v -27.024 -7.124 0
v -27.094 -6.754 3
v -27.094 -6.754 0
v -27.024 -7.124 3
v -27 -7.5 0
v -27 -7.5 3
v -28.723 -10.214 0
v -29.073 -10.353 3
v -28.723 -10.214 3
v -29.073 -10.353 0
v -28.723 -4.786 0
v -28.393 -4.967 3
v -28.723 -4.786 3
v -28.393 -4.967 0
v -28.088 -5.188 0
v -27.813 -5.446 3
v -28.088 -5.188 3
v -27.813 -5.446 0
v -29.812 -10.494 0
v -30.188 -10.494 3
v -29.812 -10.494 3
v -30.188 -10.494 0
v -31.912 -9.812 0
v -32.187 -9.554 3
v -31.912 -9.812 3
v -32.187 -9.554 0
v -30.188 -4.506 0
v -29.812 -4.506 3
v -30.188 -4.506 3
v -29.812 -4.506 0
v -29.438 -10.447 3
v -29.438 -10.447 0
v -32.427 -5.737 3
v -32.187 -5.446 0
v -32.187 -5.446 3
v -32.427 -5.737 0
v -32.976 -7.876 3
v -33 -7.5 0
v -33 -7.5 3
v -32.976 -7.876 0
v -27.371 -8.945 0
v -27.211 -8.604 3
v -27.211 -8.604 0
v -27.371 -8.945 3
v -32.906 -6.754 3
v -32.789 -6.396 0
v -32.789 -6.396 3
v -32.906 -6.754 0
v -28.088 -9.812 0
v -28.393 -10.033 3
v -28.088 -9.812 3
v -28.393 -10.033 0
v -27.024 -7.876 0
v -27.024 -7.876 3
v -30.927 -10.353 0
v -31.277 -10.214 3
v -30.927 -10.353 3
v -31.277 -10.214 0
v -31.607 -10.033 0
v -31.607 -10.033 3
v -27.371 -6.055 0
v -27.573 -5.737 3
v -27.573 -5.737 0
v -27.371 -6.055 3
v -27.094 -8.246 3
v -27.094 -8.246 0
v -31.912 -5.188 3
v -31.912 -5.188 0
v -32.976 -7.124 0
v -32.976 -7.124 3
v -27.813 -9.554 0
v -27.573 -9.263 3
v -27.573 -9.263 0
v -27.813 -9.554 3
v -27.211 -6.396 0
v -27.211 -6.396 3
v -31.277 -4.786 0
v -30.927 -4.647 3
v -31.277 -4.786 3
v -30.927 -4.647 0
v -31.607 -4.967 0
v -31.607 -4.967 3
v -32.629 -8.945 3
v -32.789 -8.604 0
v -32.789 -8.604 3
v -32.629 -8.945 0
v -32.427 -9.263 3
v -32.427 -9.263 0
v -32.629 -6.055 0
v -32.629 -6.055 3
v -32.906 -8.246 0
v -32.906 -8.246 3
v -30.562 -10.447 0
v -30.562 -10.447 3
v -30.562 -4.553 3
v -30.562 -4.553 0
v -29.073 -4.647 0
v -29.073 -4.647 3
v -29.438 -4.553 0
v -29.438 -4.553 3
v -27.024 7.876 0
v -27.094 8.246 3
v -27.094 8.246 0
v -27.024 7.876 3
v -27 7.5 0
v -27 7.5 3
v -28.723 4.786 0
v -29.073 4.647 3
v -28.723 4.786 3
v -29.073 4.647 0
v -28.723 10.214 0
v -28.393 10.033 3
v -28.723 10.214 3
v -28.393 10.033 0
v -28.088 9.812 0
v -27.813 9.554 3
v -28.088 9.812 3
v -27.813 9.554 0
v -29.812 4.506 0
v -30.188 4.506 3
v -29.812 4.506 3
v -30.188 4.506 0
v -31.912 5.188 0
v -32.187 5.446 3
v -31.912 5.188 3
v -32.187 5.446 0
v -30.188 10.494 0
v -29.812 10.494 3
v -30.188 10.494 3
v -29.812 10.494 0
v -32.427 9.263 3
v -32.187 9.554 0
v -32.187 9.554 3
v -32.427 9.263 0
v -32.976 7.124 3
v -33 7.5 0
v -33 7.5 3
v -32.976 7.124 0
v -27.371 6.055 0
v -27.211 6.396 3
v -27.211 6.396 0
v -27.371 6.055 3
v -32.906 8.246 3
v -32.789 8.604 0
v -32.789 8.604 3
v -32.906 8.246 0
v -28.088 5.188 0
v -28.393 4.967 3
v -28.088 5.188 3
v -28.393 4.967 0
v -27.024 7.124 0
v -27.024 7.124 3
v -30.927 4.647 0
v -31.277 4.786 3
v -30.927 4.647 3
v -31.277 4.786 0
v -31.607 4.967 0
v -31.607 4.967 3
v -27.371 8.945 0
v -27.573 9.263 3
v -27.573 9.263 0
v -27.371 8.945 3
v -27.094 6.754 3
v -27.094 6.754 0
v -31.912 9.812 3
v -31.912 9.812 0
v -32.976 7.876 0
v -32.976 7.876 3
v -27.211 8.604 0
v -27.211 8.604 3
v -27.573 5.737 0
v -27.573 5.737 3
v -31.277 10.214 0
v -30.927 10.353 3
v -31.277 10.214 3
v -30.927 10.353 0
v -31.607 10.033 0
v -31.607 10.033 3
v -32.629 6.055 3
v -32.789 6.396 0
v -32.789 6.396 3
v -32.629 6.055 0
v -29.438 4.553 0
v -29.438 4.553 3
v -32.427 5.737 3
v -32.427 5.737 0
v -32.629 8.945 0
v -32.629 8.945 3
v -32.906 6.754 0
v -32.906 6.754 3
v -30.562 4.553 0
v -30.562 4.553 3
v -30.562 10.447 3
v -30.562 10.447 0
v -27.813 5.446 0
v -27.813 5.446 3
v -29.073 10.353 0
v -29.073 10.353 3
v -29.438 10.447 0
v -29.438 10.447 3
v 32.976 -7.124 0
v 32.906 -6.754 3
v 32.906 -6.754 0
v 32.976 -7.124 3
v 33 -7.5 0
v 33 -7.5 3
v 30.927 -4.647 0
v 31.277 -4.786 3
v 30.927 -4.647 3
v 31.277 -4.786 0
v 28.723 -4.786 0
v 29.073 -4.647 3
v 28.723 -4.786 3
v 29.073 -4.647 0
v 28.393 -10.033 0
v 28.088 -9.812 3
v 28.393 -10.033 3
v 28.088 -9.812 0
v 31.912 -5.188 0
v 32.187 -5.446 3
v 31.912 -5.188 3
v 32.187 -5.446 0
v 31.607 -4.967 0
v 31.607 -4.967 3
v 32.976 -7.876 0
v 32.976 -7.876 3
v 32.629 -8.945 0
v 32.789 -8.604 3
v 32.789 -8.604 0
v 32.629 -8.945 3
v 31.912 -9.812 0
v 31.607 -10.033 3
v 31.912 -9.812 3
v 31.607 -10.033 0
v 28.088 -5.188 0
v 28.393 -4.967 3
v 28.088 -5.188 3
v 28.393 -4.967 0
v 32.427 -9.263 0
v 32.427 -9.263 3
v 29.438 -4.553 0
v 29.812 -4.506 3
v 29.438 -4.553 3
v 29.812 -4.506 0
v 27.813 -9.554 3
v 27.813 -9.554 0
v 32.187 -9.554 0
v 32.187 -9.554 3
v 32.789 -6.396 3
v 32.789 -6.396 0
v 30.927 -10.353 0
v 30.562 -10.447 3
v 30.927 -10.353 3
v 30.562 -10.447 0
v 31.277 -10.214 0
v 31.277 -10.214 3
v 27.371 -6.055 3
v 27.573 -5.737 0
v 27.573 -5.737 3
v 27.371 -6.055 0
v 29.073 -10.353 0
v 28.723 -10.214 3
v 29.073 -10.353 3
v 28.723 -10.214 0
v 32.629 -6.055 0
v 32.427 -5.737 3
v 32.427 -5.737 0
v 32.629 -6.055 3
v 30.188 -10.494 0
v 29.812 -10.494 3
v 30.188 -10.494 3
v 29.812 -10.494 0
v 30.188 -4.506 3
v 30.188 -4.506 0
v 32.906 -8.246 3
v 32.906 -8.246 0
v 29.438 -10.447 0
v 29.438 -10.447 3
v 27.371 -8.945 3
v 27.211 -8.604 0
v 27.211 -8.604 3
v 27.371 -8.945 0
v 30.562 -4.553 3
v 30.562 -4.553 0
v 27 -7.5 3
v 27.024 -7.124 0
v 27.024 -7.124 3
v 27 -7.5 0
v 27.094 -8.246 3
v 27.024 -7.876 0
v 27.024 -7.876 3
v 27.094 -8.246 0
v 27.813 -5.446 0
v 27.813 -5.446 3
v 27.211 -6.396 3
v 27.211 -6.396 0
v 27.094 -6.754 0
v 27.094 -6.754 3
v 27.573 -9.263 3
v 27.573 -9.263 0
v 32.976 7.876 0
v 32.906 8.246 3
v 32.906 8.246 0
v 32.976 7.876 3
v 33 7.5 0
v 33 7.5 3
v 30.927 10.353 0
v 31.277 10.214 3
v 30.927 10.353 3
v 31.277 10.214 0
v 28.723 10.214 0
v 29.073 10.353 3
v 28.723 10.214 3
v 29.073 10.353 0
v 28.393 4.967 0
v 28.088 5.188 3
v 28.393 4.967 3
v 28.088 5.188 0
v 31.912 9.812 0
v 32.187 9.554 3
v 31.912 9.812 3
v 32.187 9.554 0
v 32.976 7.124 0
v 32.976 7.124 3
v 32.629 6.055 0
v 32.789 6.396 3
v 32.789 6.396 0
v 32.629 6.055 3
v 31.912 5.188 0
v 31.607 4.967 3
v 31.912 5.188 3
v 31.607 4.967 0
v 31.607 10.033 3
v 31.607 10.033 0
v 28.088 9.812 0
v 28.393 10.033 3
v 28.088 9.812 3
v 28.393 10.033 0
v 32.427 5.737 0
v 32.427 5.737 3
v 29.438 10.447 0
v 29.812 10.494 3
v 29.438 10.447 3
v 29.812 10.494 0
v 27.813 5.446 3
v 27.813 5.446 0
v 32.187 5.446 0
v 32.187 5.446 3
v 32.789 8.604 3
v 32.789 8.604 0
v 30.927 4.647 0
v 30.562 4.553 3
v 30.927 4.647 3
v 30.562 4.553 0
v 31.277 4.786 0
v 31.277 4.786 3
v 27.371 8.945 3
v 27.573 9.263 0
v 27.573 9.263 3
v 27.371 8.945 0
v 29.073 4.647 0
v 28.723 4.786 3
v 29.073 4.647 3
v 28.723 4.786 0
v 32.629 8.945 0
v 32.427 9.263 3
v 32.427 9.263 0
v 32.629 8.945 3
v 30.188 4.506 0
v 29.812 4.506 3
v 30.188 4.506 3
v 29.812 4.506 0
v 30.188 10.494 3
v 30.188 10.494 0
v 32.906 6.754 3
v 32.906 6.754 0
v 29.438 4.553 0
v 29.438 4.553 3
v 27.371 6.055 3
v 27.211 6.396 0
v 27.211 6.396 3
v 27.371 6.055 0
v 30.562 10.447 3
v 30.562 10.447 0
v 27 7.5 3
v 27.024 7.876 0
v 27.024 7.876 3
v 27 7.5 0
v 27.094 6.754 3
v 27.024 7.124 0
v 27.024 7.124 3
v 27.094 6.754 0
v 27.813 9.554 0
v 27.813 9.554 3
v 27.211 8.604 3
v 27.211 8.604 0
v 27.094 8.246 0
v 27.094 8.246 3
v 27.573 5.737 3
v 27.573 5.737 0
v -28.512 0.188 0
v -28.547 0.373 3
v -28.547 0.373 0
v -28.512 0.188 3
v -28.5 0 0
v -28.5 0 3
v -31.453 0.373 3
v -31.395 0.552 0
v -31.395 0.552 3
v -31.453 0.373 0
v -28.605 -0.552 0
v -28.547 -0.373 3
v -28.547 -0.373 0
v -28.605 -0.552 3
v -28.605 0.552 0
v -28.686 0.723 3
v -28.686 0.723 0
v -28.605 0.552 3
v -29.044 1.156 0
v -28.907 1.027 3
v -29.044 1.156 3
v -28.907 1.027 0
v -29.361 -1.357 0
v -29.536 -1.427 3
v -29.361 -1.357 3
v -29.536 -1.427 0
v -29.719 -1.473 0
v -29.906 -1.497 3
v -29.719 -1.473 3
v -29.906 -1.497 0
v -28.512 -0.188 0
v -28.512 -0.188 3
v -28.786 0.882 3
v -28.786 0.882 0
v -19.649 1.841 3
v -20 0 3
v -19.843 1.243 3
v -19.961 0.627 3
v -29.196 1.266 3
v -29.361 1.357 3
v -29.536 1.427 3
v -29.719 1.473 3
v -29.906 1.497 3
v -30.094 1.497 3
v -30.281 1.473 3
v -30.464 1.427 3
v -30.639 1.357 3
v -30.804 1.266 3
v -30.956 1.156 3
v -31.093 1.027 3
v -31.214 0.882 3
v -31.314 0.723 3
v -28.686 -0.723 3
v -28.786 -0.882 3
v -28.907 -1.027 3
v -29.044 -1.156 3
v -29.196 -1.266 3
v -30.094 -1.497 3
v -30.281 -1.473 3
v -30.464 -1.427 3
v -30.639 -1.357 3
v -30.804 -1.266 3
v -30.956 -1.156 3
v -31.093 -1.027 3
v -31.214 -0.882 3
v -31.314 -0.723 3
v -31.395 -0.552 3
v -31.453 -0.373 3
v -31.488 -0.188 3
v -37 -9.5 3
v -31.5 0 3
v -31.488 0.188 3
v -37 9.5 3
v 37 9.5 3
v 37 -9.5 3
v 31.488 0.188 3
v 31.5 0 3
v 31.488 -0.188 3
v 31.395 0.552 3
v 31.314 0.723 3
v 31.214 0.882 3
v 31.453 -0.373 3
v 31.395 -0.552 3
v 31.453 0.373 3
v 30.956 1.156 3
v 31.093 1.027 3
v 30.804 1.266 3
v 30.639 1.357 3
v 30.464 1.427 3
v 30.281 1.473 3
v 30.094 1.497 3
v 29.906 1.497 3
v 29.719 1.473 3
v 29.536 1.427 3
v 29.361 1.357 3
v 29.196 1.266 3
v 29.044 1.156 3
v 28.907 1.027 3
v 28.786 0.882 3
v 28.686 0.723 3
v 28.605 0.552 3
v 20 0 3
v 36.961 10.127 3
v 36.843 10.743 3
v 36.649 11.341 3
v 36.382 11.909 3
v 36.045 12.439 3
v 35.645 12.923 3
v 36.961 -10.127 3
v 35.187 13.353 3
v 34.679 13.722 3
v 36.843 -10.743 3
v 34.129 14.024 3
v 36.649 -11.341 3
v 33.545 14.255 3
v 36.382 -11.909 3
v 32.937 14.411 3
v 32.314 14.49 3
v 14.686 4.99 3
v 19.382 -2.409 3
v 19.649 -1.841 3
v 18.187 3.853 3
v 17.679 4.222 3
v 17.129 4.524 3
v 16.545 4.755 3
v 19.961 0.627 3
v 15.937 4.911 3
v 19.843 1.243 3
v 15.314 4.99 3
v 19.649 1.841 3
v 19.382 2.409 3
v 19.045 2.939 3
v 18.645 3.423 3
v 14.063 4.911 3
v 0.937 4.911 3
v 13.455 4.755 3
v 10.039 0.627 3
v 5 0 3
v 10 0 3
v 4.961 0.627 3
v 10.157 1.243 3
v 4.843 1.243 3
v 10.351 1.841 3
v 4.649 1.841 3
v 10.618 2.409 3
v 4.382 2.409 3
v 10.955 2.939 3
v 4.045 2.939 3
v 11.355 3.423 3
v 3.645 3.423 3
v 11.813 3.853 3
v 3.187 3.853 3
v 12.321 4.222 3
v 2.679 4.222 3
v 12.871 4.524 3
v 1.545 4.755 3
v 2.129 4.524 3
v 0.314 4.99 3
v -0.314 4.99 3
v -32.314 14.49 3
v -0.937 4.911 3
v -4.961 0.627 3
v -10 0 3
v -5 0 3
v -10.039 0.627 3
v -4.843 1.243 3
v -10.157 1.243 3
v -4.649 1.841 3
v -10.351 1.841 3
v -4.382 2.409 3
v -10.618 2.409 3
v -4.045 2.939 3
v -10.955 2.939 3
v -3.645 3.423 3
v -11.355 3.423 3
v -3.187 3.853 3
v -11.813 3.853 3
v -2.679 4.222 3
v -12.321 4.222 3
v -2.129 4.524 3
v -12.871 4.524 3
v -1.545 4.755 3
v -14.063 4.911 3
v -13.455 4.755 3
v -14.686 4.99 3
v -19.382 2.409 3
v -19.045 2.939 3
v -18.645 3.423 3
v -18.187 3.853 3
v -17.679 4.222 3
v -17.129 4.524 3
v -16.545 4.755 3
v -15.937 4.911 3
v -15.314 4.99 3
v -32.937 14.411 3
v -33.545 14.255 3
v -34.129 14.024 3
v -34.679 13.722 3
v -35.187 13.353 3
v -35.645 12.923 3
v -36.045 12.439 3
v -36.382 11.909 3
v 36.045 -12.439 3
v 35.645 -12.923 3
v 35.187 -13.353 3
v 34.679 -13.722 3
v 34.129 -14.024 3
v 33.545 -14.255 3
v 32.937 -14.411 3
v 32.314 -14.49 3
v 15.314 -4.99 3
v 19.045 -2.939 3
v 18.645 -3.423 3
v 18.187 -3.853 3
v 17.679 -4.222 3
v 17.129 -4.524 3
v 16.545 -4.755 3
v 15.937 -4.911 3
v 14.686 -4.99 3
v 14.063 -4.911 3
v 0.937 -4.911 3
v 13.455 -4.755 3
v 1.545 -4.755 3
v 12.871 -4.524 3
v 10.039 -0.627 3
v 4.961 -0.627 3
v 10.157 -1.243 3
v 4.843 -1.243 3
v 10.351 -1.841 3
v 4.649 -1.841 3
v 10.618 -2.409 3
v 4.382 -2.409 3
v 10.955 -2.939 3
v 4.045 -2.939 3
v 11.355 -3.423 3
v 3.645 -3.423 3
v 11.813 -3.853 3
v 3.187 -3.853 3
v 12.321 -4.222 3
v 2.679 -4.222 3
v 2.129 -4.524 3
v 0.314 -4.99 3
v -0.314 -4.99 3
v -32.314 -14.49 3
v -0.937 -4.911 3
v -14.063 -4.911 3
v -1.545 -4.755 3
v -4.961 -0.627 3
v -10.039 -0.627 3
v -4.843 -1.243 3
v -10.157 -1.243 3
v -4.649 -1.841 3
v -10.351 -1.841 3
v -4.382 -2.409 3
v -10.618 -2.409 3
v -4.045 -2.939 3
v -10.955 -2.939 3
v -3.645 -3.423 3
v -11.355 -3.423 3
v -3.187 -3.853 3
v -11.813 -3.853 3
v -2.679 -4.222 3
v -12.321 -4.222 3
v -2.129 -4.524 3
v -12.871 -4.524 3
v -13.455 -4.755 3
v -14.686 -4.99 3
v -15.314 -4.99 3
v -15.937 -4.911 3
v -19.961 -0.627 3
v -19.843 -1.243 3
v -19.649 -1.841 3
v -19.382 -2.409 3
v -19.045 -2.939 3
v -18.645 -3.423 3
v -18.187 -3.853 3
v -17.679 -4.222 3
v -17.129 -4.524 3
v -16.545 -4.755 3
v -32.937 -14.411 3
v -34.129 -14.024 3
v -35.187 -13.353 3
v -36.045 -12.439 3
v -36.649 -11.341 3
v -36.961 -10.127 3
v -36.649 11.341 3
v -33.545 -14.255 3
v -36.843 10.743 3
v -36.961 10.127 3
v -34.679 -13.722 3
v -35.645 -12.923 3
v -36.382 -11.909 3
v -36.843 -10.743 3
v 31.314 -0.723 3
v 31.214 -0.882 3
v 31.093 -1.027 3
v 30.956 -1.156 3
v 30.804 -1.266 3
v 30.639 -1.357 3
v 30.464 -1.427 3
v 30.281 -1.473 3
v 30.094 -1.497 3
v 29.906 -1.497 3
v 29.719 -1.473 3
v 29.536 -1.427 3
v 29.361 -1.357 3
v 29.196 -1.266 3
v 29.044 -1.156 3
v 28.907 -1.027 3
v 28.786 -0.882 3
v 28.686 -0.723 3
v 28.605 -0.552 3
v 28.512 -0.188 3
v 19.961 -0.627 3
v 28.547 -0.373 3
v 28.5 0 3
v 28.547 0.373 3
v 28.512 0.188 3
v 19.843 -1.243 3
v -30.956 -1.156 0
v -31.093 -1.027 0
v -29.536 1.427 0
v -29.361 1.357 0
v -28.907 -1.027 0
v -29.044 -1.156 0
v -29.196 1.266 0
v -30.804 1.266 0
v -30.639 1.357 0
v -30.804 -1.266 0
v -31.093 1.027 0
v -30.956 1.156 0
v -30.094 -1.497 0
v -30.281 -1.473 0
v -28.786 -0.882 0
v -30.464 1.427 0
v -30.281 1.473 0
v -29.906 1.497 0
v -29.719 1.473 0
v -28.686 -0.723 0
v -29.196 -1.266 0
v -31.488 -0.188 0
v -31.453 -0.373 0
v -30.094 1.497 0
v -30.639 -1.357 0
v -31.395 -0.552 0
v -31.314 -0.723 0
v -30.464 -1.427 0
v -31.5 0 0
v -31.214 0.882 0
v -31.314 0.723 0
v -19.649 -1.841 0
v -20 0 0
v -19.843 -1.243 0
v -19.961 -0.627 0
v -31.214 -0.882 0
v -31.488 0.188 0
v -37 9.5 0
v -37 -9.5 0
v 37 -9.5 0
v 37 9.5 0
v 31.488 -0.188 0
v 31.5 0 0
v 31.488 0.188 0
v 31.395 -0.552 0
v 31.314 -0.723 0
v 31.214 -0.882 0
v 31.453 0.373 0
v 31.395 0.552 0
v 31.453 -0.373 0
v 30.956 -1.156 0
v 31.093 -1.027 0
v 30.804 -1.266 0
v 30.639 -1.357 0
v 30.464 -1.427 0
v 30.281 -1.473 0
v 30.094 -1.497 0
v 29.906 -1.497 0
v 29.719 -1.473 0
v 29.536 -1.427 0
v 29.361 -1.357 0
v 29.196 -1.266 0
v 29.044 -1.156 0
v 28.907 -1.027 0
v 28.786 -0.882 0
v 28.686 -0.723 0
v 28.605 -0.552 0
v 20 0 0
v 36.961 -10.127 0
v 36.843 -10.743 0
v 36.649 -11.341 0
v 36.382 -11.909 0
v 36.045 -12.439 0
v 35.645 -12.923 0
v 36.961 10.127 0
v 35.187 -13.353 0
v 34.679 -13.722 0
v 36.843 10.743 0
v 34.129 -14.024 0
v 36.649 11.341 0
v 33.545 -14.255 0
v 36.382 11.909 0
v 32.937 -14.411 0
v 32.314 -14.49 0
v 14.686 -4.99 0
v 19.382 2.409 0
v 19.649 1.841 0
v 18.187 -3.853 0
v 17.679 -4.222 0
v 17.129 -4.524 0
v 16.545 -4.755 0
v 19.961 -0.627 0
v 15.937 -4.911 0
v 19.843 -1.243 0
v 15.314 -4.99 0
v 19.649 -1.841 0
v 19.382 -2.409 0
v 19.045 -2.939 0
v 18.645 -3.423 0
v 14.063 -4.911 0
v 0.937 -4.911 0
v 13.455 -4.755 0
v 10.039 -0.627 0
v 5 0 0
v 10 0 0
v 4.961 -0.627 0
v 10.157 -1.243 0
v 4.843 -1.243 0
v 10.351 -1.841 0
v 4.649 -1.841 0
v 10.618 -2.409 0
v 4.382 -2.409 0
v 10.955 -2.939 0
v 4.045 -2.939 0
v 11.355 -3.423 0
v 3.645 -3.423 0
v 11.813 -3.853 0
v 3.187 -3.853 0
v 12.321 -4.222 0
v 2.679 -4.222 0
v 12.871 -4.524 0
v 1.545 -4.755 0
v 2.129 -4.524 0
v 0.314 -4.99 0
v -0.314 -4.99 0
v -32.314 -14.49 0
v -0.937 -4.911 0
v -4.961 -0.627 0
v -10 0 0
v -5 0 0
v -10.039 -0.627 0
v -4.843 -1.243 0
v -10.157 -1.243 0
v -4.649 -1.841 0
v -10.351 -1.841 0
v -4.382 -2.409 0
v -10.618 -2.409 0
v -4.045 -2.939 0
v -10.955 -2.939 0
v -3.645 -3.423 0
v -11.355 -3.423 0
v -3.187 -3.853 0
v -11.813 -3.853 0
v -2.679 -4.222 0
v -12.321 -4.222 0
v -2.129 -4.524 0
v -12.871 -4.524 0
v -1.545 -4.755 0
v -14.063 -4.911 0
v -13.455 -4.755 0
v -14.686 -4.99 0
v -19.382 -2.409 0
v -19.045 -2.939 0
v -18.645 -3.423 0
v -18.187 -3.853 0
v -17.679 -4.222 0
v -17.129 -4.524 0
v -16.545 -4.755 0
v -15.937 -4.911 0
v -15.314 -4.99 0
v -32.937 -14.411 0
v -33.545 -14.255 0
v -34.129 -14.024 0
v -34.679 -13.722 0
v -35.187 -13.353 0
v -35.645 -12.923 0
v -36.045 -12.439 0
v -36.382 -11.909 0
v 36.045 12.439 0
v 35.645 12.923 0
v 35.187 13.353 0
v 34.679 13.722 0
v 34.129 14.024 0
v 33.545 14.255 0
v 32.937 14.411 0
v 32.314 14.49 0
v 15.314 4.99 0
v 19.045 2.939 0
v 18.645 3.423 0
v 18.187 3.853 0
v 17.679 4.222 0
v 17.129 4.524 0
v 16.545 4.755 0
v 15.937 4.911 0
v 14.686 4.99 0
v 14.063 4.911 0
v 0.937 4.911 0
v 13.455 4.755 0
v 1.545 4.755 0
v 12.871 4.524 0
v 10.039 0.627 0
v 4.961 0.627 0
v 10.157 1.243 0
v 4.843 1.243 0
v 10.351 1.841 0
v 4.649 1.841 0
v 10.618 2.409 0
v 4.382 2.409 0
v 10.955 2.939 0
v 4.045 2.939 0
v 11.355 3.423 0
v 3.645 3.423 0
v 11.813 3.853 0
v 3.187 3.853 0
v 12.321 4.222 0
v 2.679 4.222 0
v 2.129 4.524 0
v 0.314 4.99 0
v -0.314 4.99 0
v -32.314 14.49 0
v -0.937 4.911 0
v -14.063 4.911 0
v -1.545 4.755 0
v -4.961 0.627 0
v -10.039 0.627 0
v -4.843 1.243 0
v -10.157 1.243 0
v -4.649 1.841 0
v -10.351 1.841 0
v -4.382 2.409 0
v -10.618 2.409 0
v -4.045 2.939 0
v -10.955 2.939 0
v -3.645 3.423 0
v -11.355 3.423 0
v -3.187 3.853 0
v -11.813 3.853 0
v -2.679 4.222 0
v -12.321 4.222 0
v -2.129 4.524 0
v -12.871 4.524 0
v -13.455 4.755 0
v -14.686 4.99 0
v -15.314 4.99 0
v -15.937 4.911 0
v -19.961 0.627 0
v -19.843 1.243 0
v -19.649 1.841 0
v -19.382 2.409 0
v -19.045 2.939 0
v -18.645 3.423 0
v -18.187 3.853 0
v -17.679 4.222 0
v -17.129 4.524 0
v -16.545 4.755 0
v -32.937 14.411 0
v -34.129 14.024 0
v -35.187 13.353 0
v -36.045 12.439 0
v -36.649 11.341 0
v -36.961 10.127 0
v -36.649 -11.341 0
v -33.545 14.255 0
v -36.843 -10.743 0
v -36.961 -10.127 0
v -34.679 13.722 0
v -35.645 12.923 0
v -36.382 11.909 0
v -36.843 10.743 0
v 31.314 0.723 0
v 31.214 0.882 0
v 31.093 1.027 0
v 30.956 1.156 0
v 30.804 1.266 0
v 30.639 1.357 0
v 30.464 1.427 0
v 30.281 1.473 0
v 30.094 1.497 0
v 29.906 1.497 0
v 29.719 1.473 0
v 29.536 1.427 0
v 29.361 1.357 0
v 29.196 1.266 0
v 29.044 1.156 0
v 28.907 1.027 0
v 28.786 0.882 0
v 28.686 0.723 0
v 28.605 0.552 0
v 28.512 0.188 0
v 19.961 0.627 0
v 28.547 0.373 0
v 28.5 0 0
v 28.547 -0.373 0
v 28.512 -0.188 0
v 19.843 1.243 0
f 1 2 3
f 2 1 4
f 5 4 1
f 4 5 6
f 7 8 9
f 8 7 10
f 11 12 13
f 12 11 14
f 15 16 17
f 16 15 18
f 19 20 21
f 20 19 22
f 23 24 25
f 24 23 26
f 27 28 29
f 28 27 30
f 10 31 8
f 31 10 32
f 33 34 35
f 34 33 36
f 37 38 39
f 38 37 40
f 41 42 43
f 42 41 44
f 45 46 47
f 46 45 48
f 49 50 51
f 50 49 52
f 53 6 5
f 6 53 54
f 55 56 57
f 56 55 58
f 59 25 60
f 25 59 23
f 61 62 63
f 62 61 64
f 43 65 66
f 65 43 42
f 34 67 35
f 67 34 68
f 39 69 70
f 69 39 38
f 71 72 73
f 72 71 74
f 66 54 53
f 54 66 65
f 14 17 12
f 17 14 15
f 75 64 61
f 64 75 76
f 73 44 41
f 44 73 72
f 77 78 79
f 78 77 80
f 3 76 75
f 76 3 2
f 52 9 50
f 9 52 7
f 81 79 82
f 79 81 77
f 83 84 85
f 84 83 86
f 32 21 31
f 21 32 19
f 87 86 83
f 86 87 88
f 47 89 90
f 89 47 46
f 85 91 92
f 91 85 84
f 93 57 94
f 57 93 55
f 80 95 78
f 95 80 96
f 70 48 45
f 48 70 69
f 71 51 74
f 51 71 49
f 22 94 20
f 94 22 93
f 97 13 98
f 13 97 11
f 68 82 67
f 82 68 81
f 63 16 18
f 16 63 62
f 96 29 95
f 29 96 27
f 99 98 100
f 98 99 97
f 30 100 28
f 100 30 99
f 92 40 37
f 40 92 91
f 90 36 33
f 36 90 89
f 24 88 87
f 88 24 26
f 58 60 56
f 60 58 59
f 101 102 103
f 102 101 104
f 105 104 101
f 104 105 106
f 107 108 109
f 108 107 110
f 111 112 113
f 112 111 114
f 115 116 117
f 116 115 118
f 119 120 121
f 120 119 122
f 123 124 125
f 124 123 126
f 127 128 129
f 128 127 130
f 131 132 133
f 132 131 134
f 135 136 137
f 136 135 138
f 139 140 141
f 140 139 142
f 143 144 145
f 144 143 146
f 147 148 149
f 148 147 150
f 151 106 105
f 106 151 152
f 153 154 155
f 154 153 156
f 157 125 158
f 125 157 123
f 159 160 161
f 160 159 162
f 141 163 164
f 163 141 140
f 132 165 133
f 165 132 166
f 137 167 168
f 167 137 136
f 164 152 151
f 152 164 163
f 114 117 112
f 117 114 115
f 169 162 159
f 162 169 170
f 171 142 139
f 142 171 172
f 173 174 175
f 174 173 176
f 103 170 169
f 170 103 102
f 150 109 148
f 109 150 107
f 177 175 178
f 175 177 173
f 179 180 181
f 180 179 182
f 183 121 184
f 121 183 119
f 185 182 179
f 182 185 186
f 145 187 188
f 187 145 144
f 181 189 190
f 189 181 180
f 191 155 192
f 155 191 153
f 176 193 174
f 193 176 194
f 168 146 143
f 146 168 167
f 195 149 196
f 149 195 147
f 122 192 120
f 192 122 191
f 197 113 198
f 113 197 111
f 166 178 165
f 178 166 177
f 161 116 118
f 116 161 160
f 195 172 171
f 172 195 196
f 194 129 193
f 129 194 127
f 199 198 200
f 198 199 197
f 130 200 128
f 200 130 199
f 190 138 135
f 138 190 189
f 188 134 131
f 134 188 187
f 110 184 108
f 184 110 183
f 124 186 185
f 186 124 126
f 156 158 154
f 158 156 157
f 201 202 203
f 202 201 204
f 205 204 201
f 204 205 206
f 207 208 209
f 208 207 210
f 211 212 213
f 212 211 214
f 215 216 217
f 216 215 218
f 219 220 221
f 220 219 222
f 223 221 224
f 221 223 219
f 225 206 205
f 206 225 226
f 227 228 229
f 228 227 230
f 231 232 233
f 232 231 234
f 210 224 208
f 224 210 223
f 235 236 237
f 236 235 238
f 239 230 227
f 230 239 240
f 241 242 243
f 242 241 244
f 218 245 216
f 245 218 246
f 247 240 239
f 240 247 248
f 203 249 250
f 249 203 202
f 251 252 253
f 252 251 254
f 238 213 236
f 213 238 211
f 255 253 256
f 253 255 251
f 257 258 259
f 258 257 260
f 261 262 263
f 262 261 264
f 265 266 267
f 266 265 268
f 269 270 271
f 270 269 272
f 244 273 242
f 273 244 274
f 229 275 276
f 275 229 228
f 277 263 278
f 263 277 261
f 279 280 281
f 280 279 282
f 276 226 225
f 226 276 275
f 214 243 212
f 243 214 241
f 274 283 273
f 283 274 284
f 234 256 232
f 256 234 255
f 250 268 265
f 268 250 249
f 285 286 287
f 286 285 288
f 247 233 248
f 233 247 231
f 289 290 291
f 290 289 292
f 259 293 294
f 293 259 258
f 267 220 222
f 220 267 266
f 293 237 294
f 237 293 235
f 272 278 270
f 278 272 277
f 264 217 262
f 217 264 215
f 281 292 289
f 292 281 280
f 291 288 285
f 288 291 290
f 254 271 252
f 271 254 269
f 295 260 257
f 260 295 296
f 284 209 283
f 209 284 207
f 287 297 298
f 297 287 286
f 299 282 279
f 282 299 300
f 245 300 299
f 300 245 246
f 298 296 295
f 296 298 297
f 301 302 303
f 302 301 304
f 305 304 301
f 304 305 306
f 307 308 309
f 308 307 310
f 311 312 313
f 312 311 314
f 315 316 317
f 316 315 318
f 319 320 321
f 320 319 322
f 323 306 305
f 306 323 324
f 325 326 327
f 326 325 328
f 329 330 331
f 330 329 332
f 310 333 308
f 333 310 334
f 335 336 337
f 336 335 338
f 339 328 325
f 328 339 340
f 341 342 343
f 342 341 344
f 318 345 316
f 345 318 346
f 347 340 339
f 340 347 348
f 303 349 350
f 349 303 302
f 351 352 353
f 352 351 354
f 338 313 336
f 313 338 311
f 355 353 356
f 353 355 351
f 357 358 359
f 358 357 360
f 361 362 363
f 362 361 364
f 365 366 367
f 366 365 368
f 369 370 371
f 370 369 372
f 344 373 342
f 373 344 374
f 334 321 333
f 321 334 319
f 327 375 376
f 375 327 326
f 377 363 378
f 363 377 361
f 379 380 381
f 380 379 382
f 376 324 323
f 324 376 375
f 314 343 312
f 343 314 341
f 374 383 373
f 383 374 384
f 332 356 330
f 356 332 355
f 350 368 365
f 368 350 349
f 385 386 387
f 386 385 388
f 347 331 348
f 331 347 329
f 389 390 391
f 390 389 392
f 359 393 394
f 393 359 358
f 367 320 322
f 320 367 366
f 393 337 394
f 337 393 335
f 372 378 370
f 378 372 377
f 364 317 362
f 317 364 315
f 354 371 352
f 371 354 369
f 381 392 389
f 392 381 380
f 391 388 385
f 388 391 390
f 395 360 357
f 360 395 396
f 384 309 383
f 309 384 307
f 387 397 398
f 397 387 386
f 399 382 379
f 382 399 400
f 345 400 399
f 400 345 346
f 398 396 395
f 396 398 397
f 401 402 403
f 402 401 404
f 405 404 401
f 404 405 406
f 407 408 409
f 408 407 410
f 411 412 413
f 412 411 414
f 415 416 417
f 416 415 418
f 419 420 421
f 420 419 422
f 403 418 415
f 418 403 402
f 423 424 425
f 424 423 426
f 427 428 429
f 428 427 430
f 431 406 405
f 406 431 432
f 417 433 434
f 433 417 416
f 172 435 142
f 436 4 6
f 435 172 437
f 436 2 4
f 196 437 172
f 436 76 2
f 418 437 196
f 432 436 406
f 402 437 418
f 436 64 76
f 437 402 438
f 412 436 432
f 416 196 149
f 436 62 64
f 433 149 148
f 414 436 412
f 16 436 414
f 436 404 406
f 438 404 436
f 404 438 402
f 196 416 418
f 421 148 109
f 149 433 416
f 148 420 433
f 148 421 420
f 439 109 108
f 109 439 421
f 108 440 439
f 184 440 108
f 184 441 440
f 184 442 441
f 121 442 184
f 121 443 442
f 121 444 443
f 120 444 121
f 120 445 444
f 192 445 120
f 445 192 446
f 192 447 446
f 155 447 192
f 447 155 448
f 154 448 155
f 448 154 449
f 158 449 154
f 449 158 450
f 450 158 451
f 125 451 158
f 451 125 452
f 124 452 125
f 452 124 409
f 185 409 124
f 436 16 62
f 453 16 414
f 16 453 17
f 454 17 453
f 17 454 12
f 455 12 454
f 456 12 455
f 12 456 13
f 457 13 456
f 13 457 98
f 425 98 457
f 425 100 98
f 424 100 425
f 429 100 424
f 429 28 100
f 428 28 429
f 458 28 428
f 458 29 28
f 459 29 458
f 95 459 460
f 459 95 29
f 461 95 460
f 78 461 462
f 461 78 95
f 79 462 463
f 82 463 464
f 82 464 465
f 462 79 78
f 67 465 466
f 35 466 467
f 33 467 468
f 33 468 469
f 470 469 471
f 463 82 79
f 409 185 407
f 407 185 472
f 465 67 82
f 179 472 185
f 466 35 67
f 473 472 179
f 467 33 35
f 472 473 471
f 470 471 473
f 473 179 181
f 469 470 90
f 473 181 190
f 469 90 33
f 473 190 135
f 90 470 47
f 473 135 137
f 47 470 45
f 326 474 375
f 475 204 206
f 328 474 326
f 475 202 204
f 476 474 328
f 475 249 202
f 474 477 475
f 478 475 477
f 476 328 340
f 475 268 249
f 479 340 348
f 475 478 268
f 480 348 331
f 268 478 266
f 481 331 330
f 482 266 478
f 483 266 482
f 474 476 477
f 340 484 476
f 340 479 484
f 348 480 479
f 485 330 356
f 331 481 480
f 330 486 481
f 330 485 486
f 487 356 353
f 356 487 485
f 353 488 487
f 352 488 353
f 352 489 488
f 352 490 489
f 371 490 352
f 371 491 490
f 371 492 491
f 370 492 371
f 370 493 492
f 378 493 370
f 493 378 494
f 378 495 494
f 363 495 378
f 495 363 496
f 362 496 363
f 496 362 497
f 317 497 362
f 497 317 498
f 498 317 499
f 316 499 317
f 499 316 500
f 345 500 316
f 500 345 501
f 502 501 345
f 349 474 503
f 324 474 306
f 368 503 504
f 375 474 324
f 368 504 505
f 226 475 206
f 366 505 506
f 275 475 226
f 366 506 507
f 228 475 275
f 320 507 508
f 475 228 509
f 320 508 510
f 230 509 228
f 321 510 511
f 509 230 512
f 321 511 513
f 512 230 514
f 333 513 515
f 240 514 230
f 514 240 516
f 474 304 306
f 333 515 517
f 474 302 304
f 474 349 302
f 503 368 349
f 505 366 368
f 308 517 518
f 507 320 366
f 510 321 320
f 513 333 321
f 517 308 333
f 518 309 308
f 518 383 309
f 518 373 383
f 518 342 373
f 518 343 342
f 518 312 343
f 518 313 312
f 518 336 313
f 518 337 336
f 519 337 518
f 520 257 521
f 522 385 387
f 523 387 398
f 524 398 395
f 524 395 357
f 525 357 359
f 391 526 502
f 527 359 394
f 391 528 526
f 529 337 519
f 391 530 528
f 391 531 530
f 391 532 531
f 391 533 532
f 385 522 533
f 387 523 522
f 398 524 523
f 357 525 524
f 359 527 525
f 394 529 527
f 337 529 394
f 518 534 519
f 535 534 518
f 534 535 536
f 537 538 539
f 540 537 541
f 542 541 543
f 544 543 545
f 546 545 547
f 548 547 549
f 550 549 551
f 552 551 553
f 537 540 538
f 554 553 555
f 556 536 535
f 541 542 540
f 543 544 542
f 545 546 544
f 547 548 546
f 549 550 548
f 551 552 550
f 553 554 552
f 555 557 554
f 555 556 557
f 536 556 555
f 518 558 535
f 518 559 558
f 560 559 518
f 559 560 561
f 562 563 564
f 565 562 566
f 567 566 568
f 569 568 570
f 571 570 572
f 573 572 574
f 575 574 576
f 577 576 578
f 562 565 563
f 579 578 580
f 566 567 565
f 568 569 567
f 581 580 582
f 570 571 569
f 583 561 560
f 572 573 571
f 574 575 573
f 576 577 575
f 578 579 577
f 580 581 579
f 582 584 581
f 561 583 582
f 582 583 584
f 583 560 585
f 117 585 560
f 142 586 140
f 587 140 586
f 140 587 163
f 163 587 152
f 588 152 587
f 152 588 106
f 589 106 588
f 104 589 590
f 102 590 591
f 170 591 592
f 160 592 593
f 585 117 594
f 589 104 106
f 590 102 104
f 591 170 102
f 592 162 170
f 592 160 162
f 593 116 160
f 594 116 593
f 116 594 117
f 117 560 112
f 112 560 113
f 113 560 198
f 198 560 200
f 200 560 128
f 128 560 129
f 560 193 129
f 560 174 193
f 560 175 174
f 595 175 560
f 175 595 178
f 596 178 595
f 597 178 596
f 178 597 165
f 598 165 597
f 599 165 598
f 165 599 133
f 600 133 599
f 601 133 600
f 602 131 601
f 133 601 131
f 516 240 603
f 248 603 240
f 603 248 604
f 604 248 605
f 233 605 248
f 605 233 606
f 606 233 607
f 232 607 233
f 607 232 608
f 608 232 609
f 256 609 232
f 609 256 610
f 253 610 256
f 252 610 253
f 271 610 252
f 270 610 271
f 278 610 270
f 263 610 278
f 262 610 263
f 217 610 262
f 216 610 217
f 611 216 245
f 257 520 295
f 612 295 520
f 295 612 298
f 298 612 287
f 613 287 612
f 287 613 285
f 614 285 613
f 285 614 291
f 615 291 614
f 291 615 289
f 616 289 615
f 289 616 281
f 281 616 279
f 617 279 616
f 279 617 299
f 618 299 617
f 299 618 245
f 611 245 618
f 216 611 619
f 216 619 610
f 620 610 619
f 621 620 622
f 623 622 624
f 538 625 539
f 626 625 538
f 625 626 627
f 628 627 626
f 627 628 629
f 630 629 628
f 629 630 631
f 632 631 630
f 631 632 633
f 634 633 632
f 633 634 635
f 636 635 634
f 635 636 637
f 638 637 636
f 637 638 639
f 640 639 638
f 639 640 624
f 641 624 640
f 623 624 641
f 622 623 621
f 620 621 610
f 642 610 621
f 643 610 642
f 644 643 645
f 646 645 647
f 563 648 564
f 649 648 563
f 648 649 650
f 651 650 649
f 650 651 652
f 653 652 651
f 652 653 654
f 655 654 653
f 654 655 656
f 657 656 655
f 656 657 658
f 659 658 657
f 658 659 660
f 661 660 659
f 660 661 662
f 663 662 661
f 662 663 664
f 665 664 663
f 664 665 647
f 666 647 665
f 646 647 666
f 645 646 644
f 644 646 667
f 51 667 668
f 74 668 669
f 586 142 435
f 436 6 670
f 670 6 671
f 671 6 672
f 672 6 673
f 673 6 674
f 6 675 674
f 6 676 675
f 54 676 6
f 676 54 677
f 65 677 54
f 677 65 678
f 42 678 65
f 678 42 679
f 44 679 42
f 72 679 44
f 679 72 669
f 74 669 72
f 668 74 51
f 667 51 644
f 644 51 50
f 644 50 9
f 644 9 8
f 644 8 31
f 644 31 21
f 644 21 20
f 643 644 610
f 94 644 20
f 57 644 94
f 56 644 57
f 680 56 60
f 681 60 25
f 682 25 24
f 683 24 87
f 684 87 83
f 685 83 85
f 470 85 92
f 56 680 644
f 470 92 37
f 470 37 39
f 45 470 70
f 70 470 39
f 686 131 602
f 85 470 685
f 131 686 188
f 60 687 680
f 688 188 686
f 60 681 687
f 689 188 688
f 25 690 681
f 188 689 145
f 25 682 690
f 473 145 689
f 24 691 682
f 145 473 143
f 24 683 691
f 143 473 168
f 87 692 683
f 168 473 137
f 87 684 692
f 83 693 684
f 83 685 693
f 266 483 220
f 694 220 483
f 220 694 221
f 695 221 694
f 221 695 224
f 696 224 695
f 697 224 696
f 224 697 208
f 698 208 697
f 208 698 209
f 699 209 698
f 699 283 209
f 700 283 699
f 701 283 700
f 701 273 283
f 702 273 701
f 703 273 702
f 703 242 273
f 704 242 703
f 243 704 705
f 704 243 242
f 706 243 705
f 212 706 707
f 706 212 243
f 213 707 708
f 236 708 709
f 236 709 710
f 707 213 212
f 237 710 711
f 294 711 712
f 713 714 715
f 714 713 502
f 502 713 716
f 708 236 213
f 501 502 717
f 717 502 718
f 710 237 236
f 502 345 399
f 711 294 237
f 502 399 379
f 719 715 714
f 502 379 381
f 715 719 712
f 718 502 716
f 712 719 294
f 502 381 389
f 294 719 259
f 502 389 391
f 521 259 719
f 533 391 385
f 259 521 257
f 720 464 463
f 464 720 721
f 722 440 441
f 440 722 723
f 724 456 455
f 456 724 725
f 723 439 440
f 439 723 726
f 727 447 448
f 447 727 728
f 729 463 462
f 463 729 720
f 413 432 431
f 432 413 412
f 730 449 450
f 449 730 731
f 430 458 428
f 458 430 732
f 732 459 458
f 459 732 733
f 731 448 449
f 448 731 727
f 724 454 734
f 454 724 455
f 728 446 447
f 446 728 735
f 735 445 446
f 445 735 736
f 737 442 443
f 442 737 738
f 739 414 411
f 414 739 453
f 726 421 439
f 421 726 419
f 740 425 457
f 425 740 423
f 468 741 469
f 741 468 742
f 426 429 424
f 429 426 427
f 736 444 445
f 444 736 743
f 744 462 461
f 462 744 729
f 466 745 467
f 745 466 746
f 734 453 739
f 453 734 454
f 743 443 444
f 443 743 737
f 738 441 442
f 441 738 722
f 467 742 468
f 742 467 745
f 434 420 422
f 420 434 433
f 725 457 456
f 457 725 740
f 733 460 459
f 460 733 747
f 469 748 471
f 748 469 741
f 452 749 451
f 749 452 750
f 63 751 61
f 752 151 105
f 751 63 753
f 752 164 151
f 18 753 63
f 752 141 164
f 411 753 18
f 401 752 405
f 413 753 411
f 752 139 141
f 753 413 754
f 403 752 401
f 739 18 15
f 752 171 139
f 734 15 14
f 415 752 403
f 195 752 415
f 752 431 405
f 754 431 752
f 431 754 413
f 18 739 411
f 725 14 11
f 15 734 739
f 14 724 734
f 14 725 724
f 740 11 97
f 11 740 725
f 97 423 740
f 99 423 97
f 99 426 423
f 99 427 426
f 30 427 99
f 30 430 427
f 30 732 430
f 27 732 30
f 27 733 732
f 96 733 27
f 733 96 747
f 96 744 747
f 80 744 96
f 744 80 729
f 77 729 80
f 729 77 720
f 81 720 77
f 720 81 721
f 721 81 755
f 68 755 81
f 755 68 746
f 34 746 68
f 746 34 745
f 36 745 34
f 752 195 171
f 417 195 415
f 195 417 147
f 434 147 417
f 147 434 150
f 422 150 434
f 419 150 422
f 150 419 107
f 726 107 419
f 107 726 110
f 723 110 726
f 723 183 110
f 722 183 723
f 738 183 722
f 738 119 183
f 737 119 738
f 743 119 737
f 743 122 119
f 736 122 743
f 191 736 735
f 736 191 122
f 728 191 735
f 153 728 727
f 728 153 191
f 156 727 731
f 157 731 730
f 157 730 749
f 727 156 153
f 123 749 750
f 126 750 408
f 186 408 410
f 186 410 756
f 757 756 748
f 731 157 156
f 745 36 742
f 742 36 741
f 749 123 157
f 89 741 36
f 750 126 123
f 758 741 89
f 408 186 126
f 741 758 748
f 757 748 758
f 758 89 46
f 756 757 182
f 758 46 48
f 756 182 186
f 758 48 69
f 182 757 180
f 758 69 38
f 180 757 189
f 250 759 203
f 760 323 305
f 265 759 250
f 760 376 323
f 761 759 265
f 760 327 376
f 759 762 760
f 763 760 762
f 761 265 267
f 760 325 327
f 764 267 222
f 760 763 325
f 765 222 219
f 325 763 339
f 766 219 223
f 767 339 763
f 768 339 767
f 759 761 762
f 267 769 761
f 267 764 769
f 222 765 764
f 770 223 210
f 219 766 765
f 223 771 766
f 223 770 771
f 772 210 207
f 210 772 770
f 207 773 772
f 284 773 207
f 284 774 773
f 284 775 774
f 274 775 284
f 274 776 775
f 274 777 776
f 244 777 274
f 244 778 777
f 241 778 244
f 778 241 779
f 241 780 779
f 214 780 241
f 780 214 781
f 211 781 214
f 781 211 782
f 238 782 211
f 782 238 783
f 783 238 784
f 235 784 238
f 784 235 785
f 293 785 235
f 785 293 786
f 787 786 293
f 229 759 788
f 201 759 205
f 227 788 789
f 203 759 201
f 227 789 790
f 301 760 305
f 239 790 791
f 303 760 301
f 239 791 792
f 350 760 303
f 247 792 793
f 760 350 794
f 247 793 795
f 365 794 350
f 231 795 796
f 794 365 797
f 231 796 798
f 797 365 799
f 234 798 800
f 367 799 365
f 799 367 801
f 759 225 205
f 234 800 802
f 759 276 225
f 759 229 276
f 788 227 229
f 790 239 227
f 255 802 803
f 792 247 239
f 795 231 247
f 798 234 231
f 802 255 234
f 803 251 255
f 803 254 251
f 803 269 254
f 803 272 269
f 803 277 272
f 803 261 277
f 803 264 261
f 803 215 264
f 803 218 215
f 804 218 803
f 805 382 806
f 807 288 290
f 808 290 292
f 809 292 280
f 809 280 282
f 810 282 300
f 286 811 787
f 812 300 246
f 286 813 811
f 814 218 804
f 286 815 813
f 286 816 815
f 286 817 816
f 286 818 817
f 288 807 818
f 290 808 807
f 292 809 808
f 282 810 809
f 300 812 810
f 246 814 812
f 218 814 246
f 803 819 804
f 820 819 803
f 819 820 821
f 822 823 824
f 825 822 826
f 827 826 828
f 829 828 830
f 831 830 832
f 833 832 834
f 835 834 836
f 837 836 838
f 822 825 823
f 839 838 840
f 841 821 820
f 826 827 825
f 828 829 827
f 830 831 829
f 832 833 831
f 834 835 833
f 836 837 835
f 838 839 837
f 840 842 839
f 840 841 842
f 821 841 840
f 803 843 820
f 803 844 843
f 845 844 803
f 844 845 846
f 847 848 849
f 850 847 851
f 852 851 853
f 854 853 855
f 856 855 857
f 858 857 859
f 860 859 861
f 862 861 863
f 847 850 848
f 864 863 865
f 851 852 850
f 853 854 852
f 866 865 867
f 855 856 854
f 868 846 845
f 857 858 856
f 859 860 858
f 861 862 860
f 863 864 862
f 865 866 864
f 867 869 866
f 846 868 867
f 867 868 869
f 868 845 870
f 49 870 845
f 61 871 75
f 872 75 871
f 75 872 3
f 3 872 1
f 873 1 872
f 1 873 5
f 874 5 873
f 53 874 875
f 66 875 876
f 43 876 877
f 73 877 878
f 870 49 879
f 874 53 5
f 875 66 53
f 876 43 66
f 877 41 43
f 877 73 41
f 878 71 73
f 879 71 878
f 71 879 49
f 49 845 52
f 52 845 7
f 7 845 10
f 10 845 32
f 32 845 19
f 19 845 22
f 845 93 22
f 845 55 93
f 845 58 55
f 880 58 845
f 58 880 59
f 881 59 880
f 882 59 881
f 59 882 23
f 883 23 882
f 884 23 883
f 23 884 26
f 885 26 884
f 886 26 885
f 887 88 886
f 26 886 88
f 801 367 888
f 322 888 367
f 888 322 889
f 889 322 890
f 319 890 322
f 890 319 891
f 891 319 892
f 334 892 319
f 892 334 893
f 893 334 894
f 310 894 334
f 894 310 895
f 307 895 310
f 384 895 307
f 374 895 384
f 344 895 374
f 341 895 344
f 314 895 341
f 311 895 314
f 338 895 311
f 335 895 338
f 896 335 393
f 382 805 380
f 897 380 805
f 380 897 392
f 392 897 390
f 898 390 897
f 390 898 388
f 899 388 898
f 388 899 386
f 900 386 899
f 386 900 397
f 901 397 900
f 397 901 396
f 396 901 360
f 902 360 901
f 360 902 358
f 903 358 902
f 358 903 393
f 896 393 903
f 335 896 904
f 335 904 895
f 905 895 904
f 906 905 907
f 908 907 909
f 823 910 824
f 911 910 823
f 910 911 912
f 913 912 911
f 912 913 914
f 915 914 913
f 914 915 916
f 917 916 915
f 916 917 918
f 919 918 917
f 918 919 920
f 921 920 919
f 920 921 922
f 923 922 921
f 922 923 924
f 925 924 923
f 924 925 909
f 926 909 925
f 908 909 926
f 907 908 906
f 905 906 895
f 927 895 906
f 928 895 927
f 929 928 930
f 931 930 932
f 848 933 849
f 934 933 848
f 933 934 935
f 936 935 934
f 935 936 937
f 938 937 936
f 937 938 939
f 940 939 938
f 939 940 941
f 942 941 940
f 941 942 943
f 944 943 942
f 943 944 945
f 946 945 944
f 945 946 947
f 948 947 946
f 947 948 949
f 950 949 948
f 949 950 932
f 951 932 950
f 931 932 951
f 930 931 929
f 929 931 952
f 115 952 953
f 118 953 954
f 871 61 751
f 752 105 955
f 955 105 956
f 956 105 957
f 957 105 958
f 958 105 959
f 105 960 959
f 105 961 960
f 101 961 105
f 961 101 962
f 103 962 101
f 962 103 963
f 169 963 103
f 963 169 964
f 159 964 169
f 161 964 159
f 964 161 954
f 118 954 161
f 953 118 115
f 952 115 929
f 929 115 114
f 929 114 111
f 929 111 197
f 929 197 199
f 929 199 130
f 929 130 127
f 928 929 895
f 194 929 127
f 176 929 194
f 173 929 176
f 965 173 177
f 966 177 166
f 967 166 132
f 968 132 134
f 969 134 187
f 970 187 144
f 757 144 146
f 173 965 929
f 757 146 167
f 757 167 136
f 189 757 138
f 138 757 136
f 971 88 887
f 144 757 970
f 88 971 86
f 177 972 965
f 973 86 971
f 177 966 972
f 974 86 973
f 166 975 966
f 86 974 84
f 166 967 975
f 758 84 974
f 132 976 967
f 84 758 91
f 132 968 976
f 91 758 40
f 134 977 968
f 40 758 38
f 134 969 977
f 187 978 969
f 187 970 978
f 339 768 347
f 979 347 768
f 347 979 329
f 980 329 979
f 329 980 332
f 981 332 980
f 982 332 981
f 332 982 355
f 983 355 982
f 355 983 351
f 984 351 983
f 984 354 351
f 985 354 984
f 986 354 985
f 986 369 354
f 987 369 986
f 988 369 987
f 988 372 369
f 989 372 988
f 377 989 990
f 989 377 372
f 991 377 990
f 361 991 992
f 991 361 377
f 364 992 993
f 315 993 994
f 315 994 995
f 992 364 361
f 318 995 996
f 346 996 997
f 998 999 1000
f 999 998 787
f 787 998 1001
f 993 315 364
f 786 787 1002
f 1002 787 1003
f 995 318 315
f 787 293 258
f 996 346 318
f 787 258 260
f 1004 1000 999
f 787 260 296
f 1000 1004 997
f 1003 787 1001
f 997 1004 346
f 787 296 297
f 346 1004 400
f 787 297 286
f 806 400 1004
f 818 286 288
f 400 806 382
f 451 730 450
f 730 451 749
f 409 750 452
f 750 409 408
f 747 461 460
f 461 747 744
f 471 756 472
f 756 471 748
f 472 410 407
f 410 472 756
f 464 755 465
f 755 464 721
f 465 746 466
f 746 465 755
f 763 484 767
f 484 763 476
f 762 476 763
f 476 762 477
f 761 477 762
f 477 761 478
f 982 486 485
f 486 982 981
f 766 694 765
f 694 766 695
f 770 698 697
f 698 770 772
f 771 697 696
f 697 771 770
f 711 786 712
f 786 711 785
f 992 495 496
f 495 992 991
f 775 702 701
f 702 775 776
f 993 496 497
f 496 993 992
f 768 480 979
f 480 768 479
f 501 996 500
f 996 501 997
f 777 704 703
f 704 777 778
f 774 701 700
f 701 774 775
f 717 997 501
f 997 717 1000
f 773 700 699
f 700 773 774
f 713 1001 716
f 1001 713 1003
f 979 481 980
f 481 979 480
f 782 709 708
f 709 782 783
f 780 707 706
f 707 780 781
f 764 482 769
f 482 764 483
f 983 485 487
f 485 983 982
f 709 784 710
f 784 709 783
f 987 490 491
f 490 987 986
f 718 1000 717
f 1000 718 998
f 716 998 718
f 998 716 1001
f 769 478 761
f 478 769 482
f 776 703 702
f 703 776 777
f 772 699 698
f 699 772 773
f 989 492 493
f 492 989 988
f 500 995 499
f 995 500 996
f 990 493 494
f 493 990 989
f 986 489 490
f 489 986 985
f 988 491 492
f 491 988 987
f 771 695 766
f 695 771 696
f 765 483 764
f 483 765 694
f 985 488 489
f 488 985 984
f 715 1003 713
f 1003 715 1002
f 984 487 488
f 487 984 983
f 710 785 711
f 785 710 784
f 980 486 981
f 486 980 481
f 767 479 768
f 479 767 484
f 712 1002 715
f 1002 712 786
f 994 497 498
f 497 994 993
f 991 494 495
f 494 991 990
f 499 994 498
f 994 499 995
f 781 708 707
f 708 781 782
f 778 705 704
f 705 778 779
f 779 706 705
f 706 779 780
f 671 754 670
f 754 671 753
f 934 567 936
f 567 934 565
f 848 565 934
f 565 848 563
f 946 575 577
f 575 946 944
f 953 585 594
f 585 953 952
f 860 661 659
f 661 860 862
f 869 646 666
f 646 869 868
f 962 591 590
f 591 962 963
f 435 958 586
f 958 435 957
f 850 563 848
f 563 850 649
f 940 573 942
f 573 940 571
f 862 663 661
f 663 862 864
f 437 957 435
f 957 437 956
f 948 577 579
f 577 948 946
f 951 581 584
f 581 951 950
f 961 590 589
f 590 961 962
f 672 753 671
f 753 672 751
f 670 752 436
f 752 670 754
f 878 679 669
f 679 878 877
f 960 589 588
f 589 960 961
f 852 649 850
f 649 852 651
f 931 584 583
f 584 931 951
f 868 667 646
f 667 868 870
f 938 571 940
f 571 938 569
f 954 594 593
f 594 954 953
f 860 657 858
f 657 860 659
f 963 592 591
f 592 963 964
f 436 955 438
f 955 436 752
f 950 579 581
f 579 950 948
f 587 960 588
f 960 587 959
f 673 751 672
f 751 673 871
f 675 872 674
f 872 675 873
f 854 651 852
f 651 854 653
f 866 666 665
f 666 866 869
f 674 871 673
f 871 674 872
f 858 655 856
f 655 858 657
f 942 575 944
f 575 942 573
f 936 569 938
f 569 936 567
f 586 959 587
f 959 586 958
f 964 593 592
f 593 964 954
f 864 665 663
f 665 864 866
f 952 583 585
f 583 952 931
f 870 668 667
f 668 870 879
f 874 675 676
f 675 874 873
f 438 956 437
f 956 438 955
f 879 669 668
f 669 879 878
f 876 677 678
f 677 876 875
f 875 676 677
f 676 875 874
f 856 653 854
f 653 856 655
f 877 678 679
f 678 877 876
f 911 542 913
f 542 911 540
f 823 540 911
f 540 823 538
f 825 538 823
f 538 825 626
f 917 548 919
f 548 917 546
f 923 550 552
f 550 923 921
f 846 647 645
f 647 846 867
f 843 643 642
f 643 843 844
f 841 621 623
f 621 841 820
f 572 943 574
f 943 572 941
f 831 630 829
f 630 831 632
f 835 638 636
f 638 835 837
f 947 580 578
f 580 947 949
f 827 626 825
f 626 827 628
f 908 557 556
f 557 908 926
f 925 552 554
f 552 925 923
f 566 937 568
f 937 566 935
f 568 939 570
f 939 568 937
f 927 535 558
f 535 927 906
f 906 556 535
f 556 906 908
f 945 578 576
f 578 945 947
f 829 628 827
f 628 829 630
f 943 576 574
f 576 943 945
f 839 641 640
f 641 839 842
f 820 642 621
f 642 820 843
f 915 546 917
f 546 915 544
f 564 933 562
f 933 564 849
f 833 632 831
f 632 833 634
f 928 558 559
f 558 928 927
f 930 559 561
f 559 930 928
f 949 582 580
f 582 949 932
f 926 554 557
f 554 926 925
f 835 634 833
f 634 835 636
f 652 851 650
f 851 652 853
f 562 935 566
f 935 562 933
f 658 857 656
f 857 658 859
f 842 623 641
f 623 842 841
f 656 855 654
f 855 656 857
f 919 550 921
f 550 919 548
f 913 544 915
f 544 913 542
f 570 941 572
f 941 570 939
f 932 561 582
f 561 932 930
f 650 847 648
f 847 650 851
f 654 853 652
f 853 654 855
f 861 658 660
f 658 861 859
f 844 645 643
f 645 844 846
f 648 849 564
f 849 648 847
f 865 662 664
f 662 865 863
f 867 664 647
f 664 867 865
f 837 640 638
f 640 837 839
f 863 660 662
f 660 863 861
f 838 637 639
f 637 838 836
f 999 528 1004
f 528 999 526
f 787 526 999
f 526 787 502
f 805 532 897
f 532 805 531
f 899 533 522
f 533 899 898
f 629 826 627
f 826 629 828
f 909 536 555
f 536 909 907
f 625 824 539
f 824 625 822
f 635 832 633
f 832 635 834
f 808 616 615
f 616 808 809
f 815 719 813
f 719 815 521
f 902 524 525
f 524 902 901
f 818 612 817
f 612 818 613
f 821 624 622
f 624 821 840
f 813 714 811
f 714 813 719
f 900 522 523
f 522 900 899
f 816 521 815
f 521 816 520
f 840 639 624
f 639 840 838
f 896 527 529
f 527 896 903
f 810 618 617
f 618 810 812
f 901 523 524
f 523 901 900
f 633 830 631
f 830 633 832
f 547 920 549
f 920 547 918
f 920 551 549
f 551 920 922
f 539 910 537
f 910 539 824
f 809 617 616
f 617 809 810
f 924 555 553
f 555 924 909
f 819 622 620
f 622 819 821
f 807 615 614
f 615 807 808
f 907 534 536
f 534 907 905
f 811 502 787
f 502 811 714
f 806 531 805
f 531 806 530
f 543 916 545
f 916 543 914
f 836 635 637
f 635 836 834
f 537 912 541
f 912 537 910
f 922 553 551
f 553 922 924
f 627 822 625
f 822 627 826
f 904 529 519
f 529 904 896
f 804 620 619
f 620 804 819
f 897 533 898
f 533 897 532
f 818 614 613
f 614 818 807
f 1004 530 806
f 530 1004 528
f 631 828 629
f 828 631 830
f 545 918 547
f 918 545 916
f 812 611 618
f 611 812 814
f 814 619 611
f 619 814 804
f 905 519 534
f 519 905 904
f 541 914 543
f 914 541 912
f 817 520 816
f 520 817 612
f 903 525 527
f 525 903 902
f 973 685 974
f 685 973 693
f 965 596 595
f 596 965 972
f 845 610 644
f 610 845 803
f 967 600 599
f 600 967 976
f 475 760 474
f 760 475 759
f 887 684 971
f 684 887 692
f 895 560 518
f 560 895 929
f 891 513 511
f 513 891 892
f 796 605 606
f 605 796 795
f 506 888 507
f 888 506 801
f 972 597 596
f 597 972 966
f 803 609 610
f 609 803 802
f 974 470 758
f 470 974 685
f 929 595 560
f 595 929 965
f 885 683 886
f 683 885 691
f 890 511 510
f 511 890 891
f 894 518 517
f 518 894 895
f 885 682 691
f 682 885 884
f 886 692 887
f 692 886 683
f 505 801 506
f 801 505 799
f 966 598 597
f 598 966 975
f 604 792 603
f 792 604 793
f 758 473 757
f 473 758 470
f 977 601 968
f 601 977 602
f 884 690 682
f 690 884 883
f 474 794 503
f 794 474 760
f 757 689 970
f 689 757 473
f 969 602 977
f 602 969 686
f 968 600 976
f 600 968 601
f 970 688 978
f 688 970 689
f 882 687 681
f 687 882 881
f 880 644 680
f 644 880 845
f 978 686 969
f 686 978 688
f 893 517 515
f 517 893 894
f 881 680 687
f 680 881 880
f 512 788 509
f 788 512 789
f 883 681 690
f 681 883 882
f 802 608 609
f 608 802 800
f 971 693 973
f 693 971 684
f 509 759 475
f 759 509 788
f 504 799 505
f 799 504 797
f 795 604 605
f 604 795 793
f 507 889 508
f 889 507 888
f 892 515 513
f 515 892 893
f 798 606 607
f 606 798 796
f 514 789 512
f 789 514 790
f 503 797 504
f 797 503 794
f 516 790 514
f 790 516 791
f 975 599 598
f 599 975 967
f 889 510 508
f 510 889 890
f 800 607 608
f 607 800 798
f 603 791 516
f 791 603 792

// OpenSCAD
$fn = 50;


difference() {
	union() {
		hull() {
			translate(v = [-32.0000000000, 9.5000000000, 0]) {
				cylinder(h = 3, r = 5);
			}
			translate(v = [32.0000000000, 9.5000000000, 0]) {
				cylinder(h = 3, r = 5);
			}
			translate(v = [-32.0000000000, -9.5000000000, 0]) {
				cylinder(h = 3, r = 5);
			}
			translate(v = [32.0000000000, -9.5000000000, 0]) {
				cylinder(h = 3, r = 5);
			}
		}
	}
	union() {
		#translate(v = [-30.0000000000, -7.5000000000, 0]) {
			cylinder(h = 3, r = 3.0000000000);
		}
		#translate(v = [-30.0000000000, 7.5000000000, 0]) {
			cylinder(h = 3, r = 3.0000000000);
		}
		#translate(v = [30.0000000000, -7.5000000000, 0]) {
			cylinder(h = 3, r = 3.0000000000);
		}
		#translate(v = [30.0000000000, 7.5000000000, 0]) {
			cylinder(h = 3, r = 3.0000000000);
		}
		#translate(v = [-30.0000000000, -7.5000000000, -100.0000000000]) {
			cylinder(h = 200, r = 3.0000000000);
		}
		#translate(v = [-30.0000000000, 7.5000000000, -100.0000000000]) {
			cylinder(h = 200, r = 3.0000000000);
		}
		#translate(v = [30.0000000000, -7.5000000000, -100.0000000000]) {
			cylinder(h = 200, r = 3.0000000000);
		}
		#translate(v = [30.0000000000, 7.5000000000, -100.0000000000]) {
			cylinder(h = 200, r = 3.0000000000);
		}
		#translate(v = [-30.0000000000, -7.5000000000, 0]) {
			cylinder(h = 3, r = 1.5000000000);
		}
		#translate(v = [-30.0000000000, 0.0000000000, 0]) {
			cylinder(h = 3, r = 1.5000000000);
		}
		#translate(v = [-30.0000000000, 7.5000000000, 0]) {
			cylinder(h = 3, r = 1.5000000000);
		}
		#translate(v = [30.0000000000, -7.5000000000, 0]) {
			cylinder(h = 3, r = 1.5000000000);
		}
		#translate(v = [30.0000000000, 0.0000000000, 0]) {
			cylinder(h = 3, r = 1.5000000000);
		}
		#translate(v = [30.0000000000, 7.5000000000, 0]) {
			cylinder(h = 3, r = 1.5000000000);
		}
		#translate(v = [-30.0000000000, -7.5000000000, 0]) {
			cylinder(h = 3, r = 1.5000000000);
		}
		#translate(v = [-30.0000000000, 0.0000000000, 0]) {
			cylinder(h = 3, r = 1.5000000000);
		}
		#translate(v = [-30.0000000000, 7.5000000000, 0]) {
			cylinder(h = 3, r = 1.5000000000);
		}
		#translate(v = [30.0000000000, -7.5000000000, 0]) {
			cylinder(h = 3, r = 1.5000000000);
		}
		#translate(v = [30.0000000000, 0.0000000000, 0]) {
			cylinder(h = 3, r = 1.5000000000);
		}
		#translate(v = [30.0000000000, 7.5000000000, 0]) {
			cylinder(h = 3, r = 1.5000000000);
		}
		#translate(v = [-30.0000000000, -7.5000000000, 0]) {
			cylinder(h = 3, r = 1.5000000000);
		}
		#translate(v = [-30.0000000000, 0.0000000000, 0]) {
			cylinder(h = 3, r = 1.5000000000);
		}
		#translate(v = [-30.0000000000, 7.5000000000, 0]) {
			cylinder(h = 3, r = 1.5000000000);
		}
		#translate(v = [30.0000000000, -7.5000000000, 0]) {
			cylinder(h = 3, r = 1.5000000000);
		}
		#translate(v = [30.0000000000, 0.0000000000, 0]) {
			cylinder(h = 3, r = 1.5000000000);
		}
		#translate(v = [30.0000000000, 7.5000000000, 0]) {
			cylinder(h = 3, r = 1.5000000000);
		}
		#translate(v = [-15.0000000000, 0, 0]) {
			cylinder(h = 3, r = 5.0000000000);
		}
		#cylinder(h = 3, r = 5.0000000000);
		#translate(v = [15.0000000000, 0, 0]) {
			cylinder(h = 3, r = 5.0000000000);
		}
	}
}
